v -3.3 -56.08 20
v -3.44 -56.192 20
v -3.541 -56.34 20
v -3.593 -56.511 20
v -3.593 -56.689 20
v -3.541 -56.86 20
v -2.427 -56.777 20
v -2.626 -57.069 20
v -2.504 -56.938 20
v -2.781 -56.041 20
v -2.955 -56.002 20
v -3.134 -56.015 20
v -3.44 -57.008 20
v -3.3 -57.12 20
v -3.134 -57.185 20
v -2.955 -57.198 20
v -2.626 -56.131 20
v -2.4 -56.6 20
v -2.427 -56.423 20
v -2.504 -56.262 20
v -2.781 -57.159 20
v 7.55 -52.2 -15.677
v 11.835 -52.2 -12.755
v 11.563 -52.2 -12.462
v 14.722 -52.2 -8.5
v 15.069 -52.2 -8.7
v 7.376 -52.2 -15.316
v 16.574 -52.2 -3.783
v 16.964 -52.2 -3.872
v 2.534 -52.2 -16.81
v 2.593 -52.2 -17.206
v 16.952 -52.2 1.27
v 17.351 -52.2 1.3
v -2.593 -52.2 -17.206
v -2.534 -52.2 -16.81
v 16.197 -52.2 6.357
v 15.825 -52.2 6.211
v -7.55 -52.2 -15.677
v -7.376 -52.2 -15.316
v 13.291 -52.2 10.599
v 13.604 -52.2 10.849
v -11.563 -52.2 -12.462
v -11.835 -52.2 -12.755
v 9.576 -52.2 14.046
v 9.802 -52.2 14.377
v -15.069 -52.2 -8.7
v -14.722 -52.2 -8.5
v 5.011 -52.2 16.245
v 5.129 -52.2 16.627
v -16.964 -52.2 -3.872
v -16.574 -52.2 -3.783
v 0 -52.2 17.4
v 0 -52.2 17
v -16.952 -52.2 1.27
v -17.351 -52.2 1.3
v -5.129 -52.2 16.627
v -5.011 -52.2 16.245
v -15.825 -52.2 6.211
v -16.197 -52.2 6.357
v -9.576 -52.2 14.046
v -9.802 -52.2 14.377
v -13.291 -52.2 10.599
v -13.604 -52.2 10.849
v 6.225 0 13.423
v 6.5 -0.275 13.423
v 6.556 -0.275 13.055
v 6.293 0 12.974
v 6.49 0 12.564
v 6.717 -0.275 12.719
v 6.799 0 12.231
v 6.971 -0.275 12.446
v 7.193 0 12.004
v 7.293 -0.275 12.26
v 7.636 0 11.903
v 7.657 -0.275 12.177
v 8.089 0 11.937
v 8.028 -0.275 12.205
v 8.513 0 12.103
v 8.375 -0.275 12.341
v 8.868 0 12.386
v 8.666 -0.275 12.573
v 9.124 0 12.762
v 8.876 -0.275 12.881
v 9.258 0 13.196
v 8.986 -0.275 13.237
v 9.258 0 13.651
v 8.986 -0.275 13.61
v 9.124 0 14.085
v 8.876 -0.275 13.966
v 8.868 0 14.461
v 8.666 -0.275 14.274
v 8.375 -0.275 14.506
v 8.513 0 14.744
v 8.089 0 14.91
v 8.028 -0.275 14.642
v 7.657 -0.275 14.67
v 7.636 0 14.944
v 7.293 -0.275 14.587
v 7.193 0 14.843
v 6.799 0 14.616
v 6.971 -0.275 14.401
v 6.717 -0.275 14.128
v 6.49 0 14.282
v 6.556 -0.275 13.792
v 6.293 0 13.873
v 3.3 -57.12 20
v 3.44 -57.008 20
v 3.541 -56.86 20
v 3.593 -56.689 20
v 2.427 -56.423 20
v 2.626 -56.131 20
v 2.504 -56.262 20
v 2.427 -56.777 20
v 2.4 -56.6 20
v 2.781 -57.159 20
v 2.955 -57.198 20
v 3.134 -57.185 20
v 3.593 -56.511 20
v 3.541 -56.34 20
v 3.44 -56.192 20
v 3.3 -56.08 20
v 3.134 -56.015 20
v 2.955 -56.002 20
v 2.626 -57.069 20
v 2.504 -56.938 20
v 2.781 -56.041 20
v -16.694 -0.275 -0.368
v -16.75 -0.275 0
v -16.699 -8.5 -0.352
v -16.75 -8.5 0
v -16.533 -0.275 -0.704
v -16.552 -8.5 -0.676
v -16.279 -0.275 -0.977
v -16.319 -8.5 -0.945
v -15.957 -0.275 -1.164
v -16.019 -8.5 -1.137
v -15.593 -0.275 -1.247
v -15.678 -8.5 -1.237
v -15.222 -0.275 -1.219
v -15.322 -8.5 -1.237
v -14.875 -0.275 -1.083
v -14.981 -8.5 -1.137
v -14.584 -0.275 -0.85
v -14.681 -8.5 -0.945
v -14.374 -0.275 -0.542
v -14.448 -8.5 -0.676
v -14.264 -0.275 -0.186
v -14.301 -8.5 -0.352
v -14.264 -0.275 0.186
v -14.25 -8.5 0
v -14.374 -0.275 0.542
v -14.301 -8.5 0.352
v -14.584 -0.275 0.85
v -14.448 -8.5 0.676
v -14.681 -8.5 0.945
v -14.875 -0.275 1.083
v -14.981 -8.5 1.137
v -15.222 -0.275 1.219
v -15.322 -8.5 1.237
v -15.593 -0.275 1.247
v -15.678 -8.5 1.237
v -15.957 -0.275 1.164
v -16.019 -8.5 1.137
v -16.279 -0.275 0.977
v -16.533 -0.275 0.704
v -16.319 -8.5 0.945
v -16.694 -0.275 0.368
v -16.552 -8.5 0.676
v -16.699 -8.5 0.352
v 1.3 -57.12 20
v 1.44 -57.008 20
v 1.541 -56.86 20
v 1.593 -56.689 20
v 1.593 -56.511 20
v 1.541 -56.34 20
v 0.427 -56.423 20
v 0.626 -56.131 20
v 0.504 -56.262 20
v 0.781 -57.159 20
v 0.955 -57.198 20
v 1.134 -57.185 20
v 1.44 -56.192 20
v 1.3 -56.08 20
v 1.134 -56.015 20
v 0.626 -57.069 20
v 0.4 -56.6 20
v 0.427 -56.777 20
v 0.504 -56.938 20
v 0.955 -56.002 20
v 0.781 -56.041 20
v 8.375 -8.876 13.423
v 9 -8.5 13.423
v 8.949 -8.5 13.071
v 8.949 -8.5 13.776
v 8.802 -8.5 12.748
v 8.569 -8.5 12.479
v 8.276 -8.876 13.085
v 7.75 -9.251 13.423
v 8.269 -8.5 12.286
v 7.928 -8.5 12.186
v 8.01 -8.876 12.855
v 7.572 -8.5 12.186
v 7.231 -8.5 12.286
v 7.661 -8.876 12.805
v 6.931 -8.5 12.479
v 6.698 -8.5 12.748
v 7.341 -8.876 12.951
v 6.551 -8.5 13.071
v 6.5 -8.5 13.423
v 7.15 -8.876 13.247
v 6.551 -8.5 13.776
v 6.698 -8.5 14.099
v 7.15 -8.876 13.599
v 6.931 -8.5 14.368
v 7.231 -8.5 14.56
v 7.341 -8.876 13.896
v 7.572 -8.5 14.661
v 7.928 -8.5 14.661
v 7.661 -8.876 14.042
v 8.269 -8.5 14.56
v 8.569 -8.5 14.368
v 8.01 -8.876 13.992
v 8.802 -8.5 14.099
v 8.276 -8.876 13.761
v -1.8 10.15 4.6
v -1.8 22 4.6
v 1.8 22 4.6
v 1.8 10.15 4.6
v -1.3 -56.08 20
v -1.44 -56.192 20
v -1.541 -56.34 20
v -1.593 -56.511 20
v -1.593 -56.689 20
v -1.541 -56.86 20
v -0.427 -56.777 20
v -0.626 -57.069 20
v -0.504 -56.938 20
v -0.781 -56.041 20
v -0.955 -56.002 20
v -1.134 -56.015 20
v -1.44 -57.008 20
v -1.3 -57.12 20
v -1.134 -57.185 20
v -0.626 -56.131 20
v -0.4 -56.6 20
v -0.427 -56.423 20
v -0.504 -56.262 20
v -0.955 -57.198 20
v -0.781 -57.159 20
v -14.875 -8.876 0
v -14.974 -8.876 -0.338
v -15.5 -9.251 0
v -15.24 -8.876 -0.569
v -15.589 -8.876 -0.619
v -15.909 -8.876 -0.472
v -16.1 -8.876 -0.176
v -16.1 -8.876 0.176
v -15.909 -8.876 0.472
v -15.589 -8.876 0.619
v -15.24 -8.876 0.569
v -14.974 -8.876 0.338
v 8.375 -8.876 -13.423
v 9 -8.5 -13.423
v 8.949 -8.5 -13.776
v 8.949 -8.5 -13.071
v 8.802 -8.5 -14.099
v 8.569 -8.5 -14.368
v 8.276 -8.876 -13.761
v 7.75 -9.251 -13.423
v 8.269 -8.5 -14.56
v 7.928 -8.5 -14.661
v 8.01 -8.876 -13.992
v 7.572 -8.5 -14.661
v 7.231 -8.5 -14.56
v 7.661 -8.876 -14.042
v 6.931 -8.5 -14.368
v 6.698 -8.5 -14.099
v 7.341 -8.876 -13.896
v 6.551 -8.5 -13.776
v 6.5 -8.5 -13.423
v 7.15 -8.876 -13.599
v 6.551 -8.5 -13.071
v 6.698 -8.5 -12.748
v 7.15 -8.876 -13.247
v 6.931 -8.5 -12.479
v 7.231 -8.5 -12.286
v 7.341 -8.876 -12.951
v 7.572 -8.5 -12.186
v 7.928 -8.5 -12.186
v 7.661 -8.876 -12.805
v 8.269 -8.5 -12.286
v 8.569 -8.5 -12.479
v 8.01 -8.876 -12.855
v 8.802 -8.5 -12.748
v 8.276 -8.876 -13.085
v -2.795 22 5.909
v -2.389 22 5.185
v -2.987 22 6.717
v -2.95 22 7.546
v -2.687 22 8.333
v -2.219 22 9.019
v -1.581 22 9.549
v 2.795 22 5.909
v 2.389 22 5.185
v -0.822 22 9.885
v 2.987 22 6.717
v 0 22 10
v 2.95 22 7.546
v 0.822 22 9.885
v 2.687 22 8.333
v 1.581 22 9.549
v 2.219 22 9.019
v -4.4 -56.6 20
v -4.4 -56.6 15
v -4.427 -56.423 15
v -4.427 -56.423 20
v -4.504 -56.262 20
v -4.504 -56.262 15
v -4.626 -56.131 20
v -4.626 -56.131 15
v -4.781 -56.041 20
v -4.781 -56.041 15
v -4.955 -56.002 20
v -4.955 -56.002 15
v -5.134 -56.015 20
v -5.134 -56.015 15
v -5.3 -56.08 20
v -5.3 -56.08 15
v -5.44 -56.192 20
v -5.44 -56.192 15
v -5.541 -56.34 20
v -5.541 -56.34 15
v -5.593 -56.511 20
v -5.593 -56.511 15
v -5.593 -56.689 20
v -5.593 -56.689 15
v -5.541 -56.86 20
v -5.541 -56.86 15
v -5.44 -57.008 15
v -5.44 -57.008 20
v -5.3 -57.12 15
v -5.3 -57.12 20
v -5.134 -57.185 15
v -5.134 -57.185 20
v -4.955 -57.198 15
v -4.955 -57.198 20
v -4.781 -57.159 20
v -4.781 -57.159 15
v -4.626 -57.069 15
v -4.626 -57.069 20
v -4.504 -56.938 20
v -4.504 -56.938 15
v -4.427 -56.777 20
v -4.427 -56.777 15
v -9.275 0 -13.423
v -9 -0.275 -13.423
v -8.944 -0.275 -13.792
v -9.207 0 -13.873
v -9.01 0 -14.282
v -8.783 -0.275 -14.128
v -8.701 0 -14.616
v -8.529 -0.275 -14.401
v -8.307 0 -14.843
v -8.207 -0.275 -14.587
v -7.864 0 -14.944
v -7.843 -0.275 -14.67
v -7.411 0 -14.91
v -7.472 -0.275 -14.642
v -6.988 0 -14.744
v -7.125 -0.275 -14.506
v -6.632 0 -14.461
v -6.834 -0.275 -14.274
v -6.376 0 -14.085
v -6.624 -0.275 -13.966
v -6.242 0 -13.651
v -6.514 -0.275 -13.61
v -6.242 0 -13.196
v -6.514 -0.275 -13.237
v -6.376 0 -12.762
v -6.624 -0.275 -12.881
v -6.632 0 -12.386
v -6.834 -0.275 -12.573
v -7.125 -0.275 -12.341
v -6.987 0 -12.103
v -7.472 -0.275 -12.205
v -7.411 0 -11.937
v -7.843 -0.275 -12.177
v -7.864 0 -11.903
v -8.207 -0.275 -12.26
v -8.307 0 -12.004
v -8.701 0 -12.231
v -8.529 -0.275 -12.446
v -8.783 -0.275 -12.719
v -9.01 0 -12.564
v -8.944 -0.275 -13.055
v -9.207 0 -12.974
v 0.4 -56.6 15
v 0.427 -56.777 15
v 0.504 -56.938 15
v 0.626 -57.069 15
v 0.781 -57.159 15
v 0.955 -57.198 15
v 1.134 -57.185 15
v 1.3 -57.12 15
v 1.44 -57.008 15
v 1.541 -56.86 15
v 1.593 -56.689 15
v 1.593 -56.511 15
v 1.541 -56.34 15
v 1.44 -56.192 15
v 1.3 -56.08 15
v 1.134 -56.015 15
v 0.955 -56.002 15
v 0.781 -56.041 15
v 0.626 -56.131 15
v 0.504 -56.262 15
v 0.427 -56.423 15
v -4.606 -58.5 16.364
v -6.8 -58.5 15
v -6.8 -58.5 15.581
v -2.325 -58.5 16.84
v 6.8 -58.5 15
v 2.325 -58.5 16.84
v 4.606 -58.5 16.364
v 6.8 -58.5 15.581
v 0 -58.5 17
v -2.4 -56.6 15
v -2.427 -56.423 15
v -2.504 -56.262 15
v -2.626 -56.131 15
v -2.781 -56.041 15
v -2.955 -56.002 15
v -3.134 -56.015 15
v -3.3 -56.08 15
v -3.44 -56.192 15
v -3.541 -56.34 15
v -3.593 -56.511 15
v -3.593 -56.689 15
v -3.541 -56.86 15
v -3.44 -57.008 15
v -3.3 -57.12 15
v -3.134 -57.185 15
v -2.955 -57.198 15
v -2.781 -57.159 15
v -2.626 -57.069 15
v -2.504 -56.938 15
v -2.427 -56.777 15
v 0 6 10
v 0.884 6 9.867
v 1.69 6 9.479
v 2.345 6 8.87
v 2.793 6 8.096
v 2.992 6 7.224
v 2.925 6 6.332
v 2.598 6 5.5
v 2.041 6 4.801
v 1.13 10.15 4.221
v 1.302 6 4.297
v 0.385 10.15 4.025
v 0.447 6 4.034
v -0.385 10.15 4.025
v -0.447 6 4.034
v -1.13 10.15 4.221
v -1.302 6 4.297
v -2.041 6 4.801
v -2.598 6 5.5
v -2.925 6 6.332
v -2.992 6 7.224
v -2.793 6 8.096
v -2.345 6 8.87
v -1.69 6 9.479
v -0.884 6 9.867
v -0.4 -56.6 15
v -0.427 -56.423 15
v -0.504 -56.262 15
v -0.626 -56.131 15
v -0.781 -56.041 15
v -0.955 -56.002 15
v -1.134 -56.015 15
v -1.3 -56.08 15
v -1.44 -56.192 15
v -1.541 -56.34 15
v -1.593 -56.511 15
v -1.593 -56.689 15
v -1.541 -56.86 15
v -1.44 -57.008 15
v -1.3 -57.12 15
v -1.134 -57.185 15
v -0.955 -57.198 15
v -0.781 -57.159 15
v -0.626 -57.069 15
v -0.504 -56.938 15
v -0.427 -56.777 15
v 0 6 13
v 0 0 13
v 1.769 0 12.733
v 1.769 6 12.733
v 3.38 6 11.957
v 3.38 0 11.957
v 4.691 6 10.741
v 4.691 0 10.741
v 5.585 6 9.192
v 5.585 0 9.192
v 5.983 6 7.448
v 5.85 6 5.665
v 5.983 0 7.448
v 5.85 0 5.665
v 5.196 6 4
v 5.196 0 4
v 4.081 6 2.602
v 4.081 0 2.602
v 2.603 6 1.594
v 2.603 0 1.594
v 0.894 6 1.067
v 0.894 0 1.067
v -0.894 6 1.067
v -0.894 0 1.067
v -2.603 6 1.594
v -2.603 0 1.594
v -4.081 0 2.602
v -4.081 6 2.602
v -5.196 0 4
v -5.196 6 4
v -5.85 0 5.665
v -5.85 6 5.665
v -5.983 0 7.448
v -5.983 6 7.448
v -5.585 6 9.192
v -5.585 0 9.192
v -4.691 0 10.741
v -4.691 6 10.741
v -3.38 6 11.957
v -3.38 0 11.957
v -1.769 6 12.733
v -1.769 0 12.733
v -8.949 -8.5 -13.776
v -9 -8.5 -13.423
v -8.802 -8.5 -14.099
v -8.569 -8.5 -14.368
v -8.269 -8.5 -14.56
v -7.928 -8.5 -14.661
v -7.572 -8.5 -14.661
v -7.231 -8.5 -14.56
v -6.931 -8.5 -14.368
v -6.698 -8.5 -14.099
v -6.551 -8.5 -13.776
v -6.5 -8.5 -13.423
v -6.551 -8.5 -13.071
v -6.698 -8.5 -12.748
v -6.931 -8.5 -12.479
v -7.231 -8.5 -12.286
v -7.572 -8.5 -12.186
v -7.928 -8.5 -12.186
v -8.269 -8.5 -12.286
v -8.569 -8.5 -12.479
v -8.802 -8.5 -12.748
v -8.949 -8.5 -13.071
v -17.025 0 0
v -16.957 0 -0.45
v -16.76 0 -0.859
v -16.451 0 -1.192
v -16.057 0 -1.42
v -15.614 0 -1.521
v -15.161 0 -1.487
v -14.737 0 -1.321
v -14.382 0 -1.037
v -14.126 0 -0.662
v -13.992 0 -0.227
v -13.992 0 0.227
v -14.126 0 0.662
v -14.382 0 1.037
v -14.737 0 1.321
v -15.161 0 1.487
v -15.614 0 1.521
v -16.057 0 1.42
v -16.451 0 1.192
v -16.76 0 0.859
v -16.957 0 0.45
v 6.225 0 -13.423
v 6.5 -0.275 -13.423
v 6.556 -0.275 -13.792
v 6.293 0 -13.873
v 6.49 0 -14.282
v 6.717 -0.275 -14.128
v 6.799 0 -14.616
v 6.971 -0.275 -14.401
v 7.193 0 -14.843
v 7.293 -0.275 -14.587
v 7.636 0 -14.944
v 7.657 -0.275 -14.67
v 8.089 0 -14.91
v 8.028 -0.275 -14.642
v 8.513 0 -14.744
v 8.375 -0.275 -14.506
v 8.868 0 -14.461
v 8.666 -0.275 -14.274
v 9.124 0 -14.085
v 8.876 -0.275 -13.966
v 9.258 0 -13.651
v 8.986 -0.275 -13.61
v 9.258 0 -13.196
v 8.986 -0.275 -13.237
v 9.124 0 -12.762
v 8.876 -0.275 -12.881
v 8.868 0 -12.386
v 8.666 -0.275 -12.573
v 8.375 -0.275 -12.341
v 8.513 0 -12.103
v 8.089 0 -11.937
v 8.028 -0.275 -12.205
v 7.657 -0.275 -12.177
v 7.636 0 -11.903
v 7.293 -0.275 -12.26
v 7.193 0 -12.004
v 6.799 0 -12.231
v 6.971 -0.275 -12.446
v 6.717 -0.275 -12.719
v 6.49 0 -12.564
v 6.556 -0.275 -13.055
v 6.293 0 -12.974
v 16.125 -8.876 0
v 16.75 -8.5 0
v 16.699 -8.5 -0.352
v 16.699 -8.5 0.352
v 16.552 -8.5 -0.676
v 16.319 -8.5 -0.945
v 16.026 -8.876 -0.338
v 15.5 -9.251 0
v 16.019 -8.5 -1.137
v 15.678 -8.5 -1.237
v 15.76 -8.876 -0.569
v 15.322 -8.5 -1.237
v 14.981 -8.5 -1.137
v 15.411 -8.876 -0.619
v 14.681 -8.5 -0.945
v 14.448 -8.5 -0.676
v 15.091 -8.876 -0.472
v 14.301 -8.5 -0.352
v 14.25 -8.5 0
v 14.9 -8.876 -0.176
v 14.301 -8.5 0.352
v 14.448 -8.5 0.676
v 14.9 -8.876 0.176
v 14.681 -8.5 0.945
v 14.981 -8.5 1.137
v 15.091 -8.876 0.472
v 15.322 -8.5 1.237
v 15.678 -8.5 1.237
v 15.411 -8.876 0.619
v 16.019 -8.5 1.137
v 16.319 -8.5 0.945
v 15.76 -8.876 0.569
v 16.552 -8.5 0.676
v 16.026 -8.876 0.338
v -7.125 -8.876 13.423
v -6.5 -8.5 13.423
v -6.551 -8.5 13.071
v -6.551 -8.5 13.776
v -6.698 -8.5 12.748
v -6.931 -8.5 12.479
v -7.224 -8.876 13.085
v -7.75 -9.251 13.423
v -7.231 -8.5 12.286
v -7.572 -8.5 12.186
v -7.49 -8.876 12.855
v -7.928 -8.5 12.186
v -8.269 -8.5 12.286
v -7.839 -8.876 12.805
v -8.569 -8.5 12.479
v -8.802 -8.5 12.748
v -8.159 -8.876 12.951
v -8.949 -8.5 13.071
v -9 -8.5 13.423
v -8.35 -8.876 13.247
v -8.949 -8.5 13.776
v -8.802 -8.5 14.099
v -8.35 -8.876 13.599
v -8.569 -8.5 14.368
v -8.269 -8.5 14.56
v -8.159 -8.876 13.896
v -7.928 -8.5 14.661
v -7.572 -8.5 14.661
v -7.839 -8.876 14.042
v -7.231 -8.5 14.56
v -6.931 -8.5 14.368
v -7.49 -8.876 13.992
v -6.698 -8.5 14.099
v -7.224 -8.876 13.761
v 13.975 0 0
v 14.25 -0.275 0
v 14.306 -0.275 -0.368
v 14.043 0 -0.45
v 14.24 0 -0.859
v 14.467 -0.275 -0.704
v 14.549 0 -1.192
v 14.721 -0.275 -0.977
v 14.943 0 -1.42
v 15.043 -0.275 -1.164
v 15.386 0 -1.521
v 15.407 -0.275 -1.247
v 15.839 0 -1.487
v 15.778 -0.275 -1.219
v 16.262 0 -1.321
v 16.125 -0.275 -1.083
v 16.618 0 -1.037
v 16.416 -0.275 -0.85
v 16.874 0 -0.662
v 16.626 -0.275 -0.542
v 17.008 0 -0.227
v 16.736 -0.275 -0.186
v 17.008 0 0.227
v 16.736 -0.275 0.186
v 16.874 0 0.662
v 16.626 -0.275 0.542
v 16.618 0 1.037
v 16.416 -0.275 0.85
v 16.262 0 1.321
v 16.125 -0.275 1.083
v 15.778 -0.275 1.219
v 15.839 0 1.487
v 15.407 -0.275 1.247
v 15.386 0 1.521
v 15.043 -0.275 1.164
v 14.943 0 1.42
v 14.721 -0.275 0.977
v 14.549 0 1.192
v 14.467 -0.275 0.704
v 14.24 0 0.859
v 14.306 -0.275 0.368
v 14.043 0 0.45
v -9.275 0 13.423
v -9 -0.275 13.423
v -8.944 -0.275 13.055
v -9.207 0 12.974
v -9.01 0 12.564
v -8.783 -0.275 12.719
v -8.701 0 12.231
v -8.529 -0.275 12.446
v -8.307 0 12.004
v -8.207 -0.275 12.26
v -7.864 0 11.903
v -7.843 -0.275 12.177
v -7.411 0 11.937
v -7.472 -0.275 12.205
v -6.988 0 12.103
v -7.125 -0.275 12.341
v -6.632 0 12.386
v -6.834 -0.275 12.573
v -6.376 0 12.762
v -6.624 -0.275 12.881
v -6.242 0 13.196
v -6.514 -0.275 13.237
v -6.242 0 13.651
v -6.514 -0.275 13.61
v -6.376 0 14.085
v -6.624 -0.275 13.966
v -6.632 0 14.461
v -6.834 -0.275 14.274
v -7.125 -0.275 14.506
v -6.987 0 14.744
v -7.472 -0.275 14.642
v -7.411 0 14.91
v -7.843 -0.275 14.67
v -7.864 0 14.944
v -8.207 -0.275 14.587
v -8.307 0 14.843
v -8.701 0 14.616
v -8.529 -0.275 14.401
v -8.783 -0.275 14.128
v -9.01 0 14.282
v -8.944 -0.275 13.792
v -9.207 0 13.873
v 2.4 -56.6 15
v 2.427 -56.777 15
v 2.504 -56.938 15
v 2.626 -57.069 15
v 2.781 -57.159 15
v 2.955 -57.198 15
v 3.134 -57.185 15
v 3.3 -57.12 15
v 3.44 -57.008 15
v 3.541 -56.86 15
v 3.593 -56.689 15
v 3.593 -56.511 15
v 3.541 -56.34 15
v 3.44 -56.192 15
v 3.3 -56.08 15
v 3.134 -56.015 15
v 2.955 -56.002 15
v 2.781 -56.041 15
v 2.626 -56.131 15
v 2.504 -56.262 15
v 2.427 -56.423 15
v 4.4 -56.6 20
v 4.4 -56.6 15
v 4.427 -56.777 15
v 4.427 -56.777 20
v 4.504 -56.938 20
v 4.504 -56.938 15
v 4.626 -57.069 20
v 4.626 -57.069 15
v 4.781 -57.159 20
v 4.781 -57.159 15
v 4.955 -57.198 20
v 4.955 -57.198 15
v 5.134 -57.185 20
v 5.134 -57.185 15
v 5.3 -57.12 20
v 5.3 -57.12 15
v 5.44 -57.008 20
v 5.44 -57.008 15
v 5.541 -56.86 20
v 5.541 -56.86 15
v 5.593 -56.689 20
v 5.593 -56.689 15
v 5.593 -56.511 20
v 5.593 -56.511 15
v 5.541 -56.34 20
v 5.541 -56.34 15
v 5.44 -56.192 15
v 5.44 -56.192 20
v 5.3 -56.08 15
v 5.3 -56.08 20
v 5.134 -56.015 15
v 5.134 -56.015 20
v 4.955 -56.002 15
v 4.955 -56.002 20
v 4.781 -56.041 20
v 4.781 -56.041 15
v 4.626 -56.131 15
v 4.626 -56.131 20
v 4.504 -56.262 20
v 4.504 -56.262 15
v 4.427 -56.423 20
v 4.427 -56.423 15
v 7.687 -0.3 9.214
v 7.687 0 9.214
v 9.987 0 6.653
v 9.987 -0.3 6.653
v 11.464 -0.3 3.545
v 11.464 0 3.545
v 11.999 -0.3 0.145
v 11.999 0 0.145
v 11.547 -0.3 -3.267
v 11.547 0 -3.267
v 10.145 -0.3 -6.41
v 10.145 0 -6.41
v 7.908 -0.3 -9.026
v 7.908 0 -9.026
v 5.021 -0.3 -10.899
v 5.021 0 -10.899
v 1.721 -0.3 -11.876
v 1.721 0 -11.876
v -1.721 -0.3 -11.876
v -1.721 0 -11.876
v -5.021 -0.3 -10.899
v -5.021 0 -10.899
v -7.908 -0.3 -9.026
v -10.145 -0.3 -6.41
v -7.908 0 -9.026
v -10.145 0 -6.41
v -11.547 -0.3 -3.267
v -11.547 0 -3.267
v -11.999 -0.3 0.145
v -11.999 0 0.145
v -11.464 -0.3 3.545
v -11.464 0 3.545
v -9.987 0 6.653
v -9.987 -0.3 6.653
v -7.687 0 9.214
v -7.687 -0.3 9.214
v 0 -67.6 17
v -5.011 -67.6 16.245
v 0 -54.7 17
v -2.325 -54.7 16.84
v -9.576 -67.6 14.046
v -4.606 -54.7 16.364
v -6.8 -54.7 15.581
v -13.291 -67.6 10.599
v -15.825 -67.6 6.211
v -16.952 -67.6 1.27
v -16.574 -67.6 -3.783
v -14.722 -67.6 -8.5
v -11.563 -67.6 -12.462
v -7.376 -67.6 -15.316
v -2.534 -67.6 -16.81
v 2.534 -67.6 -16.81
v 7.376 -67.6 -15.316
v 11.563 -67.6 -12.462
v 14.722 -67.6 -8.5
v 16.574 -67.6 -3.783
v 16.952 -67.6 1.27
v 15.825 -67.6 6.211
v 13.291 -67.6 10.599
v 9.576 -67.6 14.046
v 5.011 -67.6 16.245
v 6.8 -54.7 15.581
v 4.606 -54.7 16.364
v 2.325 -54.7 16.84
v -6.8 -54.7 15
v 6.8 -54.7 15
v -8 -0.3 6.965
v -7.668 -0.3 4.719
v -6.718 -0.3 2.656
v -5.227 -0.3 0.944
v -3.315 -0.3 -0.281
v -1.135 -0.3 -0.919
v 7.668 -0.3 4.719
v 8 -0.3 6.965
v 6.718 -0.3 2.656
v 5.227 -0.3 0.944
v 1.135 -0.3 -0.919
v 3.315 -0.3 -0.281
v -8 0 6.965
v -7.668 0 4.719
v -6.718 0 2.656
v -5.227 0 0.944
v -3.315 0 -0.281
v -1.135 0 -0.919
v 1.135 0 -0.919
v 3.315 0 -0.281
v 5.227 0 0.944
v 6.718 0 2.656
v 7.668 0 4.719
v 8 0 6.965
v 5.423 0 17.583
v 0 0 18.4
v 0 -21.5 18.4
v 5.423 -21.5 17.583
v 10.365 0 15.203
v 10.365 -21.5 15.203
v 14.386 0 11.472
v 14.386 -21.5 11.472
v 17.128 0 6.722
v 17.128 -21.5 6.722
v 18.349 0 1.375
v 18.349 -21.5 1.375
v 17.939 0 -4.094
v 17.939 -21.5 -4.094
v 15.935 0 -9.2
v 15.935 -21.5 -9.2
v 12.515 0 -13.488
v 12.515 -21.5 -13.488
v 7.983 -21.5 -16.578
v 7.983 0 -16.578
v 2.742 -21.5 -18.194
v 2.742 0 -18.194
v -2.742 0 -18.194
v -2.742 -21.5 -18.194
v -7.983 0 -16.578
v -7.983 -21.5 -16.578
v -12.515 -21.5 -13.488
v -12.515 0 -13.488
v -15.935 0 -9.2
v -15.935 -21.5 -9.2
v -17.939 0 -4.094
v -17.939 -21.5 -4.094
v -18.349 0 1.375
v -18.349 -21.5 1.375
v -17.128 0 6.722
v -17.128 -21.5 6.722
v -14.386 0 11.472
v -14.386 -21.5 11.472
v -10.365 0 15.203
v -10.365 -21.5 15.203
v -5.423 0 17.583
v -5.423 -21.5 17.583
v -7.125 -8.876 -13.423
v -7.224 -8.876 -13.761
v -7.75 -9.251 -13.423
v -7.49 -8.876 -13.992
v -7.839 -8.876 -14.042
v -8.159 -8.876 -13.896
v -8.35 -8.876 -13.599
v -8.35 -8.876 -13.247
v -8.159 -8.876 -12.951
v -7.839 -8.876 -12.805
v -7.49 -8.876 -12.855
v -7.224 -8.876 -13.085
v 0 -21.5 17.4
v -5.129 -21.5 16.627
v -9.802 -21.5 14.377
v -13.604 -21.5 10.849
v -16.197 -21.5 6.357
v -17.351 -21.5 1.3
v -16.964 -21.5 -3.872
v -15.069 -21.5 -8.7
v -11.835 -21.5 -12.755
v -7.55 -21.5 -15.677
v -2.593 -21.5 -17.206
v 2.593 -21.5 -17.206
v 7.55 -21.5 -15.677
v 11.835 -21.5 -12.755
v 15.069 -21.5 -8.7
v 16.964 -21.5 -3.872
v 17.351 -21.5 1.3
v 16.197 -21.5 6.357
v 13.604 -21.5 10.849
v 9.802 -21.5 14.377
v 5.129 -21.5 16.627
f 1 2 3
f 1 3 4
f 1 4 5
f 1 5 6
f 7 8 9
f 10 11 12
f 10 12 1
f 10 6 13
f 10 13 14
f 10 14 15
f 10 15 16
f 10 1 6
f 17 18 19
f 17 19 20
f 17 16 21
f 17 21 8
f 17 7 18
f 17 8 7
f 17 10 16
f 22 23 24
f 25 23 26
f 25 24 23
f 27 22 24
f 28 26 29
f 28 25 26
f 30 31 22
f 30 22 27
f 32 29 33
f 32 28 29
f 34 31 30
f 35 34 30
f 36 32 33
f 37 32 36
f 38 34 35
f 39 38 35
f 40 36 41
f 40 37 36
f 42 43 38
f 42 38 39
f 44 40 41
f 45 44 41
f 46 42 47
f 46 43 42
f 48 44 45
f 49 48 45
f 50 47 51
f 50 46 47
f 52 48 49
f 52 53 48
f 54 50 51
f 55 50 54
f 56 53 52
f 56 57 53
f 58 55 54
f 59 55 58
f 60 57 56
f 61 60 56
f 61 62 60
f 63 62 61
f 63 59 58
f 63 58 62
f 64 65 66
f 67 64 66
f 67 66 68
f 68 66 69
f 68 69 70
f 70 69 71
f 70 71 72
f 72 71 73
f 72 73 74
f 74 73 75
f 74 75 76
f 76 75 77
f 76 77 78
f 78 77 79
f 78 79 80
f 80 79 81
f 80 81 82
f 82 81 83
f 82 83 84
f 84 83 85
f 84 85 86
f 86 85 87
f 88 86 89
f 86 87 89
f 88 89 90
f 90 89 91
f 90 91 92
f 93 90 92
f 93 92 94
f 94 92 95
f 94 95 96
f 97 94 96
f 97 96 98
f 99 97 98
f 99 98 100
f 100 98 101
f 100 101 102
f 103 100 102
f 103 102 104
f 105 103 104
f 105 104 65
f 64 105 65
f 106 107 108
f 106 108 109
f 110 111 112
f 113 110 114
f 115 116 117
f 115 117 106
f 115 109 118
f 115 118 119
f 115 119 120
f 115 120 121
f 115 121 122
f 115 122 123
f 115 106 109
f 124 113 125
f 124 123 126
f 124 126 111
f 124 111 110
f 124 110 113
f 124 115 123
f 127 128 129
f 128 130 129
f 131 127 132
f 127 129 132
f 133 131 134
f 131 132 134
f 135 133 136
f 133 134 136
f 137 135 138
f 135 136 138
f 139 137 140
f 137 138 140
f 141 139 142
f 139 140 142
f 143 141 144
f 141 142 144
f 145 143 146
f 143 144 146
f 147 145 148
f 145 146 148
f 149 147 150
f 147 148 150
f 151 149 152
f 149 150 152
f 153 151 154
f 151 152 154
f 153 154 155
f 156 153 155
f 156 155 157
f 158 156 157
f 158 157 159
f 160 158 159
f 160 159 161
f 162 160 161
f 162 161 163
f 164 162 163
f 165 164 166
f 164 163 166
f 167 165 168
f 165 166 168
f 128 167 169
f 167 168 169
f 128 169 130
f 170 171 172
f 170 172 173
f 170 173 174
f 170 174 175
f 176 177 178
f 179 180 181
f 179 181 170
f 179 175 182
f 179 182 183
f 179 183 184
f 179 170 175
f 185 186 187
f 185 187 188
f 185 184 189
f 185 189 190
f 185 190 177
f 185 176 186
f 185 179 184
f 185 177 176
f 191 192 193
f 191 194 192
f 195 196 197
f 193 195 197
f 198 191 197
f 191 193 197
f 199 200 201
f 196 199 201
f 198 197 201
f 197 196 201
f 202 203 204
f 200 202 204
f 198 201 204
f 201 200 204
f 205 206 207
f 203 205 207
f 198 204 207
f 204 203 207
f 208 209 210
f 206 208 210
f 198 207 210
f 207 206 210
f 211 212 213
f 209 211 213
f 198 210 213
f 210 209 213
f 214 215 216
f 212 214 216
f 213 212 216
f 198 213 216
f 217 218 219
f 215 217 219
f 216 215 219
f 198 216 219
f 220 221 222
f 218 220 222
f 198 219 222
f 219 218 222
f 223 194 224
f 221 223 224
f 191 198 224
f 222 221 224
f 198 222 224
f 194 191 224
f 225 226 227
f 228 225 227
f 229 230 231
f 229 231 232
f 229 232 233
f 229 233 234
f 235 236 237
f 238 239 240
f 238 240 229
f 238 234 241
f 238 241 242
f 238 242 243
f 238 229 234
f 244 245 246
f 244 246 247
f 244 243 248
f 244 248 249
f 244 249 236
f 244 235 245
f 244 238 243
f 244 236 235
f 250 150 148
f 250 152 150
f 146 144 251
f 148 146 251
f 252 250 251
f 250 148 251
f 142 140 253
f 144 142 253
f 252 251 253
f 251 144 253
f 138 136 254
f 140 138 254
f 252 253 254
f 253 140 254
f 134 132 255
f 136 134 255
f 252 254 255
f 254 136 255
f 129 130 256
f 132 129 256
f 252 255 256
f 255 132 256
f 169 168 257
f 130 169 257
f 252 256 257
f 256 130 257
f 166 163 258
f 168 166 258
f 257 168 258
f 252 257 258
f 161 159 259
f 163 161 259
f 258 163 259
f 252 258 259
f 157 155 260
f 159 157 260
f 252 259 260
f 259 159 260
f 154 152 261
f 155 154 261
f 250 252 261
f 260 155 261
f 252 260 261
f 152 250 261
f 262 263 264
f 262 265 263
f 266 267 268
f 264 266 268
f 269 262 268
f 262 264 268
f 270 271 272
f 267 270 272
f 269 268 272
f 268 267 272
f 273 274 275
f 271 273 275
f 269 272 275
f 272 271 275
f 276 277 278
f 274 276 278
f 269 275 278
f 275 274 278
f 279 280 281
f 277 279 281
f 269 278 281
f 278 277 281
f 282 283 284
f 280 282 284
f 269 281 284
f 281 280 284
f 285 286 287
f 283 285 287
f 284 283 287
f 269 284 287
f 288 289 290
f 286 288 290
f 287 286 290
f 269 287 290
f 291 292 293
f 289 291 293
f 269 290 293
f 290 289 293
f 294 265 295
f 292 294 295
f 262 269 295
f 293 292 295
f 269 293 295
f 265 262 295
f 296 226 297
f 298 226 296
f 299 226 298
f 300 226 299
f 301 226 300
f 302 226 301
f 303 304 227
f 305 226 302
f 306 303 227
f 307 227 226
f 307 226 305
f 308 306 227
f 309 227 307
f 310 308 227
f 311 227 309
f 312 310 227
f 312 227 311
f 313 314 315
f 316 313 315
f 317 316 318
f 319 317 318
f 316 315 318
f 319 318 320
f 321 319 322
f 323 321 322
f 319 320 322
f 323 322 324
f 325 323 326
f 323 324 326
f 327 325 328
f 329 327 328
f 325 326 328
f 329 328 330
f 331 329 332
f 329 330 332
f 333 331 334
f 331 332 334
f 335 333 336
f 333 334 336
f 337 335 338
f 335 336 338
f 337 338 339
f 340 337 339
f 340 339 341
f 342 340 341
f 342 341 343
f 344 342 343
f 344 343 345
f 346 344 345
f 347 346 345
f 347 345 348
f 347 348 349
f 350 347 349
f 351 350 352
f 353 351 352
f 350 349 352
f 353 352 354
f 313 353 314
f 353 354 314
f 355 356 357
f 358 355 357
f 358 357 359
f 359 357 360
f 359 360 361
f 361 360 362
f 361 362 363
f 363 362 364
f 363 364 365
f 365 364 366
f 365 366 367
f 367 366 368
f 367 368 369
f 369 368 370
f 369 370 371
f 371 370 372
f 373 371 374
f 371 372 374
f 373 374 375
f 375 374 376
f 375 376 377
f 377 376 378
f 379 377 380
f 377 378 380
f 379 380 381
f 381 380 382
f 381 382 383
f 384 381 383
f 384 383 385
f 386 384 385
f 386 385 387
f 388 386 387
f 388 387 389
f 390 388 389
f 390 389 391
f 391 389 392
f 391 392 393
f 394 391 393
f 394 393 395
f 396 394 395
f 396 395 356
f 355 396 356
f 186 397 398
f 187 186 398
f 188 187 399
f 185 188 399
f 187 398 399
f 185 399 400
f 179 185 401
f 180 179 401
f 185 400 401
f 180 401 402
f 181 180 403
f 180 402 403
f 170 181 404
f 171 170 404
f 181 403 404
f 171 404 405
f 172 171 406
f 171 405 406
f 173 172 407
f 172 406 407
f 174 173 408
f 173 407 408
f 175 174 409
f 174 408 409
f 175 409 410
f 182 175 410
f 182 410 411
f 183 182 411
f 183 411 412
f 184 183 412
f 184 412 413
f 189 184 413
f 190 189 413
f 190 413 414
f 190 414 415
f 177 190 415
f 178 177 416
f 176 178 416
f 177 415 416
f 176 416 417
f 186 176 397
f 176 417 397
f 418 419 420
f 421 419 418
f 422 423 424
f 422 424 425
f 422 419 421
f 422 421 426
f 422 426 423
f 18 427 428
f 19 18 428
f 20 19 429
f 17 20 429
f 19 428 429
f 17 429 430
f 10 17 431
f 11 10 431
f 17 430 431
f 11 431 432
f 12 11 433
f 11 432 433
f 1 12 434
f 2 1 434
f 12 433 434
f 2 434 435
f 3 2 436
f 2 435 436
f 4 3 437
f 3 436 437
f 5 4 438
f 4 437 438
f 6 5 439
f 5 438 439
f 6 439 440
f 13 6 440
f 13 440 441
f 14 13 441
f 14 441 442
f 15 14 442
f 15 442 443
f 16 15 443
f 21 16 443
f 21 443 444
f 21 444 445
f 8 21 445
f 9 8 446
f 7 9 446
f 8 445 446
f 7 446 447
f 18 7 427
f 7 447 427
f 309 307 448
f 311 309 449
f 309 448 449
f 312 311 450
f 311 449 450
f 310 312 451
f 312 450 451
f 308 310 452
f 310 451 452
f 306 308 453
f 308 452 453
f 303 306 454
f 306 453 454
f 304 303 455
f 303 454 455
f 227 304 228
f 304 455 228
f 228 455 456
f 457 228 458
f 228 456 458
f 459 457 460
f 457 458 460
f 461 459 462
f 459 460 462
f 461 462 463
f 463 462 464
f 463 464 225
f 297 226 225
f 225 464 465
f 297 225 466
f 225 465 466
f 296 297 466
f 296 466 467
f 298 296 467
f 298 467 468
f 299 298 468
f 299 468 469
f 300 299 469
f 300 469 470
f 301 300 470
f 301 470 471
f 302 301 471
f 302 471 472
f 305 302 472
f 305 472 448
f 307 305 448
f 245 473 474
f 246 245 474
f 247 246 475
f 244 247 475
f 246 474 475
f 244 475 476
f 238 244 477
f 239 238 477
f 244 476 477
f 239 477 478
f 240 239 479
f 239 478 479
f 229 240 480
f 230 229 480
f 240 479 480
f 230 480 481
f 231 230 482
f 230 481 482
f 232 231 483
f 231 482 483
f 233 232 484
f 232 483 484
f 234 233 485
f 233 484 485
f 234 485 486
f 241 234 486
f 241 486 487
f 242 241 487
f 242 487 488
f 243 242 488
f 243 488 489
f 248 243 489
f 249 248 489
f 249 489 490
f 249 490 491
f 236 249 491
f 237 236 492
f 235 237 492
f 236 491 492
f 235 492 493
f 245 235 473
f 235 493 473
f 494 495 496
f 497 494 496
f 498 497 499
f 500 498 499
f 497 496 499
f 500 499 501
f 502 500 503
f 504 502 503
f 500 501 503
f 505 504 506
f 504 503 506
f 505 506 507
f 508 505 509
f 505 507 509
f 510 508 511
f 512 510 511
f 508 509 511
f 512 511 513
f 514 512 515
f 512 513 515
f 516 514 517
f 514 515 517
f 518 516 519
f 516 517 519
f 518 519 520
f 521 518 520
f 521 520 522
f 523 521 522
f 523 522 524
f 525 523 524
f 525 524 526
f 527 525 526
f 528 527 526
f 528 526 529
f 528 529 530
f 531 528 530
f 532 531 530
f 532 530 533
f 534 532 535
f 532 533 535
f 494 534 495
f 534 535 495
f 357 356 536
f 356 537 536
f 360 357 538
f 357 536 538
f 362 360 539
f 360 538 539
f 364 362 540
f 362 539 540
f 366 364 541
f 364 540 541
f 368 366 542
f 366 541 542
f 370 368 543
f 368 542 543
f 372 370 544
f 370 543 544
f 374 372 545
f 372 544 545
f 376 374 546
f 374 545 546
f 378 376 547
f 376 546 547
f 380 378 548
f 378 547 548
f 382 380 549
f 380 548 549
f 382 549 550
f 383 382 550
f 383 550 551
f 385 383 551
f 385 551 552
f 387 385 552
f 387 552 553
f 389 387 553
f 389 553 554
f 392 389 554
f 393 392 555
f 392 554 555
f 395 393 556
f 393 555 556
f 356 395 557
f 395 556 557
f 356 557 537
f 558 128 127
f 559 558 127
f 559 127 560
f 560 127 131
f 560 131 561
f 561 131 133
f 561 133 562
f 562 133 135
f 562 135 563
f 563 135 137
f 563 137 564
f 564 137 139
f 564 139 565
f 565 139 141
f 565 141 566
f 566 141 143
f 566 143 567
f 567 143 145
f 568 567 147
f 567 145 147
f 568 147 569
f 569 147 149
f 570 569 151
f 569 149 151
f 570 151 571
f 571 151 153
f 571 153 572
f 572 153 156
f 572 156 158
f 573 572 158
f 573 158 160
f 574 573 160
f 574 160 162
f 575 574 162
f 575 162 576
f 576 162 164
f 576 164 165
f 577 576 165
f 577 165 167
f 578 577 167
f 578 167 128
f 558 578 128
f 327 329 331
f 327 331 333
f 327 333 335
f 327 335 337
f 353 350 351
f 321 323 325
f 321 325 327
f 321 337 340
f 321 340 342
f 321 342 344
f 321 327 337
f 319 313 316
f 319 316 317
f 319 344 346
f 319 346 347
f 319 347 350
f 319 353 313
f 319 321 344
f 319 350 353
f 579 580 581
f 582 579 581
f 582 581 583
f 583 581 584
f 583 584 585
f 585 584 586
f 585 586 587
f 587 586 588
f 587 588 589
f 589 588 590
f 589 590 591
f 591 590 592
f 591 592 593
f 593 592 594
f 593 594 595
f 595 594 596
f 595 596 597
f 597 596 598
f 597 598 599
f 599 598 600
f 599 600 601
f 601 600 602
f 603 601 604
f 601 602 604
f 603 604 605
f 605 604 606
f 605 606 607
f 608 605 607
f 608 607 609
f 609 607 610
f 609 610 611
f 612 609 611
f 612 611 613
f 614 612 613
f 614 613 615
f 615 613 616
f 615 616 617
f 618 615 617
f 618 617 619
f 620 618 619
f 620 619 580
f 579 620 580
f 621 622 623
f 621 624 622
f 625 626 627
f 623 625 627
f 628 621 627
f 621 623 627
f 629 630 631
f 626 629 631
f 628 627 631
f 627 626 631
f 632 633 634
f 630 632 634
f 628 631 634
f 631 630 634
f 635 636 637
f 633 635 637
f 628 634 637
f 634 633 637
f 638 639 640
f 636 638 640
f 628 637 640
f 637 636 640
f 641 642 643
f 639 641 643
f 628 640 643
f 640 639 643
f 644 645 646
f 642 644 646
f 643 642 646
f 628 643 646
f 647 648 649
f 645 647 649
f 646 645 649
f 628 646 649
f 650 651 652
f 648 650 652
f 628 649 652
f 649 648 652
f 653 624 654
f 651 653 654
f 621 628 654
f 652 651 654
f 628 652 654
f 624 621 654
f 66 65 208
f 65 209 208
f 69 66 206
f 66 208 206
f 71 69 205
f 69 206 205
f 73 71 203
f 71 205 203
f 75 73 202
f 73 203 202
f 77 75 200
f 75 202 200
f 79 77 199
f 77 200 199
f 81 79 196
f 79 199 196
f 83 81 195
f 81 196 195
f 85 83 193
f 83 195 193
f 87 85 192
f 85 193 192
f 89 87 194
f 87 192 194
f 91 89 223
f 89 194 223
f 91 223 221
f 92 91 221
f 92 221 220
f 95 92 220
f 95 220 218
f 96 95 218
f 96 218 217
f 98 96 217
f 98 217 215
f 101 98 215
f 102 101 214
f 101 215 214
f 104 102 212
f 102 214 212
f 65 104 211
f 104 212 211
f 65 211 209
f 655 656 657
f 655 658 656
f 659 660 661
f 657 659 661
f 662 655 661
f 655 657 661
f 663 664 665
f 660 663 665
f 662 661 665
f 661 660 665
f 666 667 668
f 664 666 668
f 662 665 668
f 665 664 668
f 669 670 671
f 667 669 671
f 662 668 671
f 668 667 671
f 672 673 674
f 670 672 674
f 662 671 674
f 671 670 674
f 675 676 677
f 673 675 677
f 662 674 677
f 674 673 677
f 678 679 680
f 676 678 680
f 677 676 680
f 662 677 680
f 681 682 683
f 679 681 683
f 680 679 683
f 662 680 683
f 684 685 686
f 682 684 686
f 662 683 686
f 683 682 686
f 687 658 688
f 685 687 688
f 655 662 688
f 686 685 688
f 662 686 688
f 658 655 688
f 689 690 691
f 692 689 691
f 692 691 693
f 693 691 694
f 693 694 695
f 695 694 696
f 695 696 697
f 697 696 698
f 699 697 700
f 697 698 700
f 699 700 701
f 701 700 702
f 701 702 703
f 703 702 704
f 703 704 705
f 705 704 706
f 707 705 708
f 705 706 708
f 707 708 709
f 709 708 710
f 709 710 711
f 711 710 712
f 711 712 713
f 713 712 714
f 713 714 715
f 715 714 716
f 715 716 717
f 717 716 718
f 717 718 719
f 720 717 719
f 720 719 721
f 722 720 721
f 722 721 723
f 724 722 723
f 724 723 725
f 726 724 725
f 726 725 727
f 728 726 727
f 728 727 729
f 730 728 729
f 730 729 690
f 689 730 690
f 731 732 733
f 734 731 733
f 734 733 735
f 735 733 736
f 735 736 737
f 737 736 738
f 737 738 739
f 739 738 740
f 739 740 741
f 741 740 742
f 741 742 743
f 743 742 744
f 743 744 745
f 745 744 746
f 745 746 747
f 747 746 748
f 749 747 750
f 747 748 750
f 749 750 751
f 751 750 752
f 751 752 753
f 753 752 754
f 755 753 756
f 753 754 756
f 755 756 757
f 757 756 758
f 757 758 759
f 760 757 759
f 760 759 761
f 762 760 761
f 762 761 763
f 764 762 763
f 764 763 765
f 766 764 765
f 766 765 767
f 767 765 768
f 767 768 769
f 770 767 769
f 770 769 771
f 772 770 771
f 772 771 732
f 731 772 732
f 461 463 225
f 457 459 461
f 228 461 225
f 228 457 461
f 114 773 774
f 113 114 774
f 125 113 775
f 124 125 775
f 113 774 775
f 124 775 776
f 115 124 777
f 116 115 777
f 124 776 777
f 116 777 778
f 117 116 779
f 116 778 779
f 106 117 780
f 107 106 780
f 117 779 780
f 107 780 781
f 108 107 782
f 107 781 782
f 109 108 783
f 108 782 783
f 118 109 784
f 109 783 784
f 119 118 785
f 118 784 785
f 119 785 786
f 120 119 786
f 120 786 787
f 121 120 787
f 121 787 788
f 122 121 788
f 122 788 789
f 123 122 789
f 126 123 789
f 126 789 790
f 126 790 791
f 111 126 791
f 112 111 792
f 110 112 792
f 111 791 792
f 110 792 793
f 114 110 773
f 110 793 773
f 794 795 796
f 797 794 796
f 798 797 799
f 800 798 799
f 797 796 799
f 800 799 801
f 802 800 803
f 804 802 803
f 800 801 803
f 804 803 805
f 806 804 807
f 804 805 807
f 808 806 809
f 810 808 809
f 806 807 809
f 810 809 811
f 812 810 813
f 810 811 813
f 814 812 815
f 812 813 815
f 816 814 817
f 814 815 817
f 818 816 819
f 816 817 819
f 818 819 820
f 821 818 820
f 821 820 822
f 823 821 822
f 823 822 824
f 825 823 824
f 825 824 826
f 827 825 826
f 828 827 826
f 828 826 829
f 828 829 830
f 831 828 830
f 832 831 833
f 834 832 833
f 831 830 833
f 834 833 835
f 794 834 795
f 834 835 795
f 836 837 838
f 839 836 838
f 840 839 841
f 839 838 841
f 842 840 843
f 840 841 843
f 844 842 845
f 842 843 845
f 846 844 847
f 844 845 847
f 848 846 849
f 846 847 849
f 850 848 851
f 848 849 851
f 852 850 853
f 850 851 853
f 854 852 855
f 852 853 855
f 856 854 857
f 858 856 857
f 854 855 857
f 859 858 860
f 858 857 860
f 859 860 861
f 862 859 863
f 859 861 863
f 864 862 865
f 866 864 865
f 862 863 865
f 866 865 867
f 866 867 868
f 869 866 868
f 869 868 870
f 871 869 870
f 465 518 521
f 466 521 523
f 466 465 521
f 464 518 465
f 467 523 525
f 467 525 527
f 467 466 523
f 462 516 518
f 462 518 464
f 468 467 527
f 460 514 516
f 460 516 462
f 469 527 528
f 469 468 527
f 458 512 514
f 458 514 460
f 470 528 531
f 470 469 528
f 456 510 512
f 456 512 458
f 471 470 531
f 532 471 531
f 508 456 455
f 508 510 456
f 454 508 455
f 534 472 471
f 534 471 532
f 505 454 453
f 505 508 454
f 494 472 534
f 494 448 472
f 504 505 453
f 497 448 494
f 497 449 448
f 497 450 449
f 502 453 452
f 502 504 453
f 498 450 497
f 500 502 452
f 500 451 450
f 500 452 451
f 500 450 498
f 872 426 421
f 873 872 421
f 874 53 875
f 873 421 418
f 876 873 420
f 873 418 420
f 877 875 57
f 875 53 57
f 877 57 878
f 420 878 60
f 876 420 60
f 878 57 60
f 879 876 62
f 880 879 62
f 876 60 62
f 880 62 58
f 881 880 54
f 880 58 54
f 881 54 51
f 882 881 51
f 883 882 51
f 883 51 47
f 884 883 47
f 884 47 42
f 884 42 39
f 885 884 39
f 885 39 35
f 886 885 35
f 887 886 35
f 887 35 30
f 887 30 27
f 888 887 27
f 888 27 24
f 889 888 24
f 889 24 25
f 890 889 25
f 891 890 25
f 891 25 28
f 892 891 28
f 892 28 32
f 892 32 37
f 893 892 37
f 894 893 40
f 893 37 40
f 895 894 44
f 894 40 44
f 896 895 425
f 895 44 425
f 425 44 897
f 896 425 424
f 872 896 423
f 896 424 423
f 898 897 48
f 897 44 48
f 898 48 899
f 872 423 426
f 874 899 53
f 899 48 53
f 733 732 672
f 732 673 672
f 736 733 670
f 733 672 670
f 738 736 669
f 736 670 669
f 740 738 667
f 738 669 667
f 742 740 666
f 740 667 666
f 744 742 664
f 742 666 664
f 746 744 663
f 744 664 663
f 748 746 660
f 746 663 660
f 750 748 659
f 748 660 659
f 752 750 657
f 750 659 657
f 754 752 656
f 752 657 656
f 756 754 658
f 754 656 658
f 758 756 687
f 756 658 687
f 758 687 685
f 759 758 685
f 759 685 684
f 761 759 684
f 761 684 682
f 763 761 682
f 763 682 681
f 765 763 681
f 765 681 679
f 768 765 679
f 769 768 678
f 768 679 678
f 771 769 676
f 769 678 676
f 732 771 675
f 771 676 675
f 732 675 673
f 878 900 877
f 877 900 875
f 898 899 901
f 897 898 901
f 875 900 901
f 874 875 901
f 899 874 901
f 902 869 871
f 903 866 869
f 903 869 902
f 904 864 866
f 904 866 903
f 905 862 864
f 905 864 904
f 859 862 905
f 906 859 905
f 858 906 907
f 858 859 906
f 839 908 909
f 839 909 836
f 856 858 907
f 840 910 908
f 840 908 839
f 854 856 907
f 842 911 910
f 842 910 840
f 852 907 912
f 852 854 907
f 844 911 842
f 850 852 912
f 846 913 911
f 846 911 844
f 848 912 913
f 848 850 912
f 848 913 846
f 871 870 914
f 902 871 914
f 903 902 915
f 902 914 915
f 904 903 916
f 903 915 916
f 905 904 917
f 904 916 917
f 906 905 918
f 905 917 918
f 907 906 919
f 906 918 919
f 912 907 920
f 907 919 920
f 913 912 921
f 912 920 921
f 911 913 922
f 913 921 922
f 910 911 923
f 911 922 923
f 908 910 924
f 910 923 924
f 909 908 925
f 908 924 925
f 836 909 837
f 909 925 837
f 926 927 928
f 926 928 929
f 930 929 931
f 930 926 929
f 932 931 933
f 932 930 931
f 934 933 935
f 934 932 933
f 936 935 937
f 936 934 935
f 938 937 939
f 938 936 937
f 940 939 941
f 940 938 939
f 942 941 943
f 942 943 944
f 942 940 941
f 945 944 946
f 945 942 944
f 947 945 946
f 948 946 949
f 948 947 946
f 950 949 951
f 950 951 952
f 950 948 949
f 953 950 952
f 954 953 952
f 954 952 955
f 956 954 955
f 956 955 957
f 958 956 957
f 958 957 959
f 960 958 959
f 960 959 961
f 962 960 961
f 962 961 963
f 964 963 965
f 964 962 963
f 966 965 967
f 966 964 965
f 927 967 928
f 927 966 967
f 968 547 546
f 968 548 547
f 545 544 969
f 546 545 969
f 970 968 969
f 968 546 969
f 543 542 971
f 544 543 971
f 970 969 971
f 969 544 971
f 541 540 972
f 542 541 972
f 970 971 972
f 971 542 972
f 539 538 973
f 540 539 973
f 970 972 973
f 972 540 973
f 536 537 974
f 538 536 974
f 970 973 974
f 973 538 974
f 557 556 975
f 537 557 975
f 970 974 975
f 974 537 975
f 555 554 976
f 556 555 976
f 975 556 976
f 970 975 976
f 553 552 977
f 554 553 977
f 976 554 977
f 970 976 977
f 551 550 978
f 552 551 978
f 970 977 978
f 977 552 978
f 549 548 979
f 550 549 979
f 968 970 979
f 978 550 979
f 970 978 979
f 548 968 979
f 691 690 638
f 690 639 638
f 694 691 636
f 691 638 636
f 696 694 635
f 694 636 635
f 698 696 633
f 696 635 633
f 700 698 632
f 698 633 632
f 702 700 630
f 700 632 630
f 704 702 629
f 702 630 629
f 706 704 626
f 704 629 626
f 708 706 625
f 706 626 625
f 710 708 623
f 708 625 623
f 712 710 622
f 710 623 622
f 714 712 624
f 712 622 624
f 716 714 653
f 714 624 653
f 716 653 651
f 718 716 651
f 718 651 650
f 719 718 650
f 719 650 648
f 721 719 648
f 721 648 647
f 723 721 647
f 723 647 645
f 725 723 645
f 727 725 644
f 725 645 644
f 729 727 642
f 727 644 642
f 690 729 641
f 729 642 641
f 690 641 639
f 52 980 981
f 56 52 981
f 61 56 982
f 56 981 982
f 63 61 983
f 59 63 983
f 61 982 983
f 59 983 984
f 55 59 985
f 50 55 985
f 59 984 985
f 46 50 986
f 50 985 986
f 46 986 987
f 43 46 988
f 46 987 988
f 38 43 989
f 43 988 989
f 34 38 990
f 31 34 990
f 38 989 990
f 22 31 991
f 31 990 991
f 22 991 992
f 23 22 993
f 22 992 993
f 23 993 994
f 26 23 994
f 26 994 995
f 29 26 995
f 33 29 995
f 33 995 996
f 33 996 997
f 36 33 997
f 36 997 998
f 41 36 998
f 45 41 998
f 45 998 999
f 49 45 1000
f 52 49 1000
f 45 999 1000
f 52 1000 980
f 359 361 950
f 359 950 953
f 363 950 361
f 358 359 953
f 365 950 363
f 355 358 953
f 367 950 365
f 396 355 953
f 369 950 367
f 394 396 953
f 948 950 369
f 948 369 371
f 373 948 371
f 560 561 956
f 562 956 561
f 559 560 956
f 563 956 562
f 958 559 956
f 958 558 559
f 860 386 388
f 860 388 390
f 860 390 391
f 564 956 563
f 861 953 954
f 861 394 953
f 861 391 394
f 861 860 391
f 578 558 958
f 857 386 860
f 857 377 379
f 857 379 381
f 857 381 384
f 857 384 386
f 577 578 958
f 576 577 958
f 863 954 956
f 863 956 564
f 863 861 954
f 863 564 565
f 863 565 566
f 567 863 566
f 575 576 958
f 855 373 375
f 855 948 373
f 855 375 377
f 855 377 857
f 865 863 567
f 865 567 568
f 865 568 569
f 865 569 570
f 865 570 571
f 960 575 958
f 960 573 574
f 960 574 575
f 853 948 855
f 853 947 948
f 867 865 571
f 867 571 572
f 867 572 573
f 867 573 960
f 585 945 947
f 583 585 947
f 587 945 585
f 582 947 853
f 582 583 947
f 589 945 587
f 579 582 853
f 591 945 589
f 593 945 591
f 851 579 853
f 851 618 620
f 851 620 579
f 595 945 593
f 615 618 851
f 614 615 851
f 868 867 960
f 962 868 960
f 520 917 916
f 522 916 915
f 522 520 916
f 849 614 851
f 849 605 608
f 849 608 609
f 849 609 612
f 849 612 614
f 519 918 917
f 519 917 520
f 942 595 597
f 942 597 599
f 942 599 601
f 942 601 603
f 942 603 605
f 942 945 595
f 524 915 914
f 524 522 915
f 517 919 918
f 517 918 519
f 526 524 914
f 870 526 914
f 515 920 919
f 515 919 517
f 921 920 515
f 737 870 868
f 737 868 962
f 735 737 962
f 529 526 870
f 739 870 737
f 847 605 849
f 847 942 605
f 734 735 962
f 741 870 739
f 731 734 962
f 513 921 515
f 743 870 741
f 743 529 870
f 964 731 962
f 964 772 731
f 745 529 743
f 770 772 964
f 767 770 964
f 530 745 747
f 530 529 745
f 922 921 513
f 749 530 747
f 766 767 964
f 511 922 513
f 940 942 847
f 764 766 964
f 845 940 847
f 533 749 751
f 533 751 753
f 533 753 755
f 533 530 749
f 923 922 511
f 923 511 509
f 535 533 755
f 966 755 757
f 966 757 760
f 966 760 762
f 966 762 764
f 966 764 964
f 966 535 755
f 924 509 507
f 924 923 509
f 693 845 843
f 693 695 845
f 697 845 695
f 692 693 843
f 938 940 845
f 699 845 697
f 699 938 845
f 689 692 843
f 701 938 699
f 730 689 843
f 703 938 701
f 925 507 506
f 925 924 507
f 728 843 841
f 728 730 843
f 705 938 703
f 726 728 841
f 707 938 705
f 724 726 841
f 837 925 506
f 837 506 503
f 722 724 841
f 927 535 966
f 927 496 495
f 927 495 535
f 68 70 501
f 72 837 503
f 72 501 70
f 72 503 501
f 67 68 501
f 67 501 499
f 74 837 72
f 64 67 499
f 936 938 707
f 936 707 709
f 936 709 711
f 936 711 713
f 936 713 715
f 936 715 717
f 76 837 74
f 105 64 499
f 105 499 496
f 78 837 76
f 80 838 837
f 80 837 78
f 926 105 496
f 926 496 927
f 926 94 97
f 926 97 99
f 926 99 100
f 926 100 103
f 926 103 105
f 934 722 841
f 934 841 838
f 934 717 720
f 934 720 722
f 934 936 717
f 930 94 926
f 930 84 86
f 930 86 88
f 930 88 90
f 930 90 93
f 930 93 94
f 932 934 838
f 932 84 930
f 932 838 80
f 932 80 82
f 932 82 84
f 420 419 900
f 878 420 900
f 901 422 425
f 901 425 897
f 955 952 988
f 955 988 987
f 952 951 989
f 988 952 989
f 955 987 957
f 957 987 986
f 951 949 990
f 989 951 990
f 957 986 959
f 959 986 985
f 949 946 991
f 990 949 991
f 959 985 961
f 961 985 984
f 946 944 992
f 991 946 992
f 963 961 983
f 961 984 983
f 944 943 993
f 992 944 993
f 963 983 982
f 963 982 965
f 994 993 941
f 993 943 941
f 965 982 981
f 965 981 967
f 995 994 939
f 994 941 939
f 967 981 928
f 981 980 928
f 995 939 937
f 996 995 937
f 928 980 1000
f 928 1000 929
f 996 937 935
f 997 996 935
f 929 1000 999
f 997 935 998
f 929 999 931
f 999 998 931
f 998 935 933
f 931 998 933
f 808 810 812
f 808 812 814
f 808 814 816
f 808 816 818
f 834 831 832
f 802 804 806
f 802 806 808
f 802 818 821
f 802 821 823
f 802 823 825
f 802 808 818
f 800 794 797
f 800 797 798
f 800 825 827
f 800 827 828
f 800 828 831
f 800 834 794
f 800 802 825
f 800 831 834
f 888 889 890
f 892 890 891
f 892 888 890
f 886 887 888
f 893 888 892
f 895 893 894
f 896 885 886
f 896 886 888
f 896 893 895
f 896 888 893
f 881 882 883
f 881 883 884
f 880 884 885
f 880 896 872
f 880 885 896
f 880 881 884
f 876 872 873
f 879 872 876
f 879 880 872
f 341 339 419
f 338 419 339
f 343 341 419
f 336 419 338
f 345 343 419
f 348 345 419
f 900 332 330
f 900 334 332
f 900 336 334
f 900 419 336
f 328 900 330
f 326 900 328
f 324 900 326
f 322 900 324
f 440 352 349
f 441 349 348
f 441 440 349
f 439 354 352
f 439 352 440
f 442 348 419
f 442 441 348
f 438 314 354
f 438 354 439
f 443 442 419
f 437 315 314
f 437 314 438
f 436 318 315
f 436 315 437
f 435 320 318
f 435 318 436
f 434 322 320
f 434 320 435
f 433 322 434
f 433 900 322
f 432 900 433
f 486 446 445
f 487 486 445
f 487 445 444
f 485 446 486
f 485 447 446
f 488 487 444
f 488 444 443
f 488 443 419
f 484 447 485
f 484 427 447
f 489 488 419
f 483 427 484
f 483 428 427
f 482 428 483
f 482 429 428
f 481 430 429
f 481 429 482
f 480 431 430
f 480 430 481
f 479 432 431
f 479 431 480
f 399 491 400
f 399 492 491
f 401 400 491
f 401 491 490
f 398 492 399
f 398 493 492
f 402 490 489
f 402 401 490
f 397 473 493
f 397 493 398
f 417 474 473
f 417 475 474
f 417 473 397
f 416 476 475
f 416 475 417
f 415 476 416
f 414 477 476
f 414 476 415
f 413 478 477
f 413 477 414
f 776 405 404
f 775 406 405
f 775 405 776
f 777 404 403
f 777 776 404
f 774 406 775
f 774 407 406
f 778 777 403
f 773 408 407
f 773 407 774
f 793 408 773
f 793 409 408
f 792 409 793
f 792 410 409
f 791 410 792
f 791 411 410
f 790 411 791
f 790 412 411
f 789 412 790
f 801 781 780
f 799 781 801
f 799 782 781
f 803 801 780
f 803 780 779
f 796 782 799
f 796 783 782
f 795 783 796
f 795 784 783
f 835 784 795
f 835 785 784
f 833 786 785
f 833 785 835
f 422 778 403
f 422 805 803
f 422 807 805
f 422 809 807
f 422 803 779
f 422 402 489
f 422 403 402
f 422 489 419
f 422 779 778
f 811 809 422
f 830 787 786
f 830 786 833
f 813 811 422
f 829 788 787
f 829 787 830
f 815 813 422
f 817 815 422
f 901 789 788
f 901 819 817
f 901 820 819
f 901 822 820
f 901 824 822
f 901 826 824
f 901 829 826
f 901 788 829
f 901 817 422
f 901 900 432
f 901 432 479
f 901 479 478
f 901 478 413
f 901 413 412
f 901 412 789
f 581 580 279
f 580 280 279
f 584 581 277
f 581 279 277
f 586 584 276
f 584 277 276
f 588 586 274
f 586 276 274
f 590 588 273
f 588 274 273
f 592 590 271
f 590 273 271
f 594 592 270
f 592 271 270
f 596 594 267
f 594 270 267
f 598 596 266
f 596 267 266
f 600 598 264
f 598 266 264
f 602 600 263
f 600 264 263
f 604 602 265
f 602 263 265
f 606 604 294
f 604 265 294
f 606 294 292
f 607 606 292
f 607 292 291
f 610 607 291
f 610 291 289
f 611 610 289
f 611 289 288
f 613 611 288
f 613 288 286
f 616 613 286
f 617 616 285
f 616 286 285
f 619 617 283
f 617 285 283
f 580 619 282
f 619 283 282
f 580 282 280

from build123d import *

# Parameters (mm, degrees)
SKETCH_1_R                   = 18.4
EXTRUDE_1_DEPTH              = 21.5
SKETCH_2_R                   = 6
EXTRUDE_2_DEPTH              = 6
SKETCH_3_R                   = 3
EXTRUDE_3_DEPTH              = 16
SKETCH_4_W                   = 5
SKETCH_4_H                   = 1
CUT_EXTRUDE_1_DEPTH          = 11.85
SKETCH_5_R                   = 17.4
EXTRUDE_4_DEPTH              = 30.7
SKETCH_6_R                   = 17
EXTRUDE_5_DEPTH              = 15.4
CUT_EXTRUDE_START            = 15
SKETCH_7_W                   = 13.6
SKETCH_7_H                   = 3.8
CUT_EXTRUDE_2_DEPTH          = 58.435350486
SKETCH_8_R                   = 0.6
EXTRUDE_6_DEPTH              = 5
HOLE_WIZARD_M3_1_D           = 2.5
HOLE_WIZARD_M3_1_DEPTH       = 8.5
HOLE_WIZARD_M3_1_CSINK_D     = 3.05
HOLE_WIZARD_M3_1_CSINK_ANGLE = 90
HOLE_WIZARD_M3_1_TIP         = 0.751075774
CUT_EXTRUDE_3_DEPTH          = 0.3


with BuildPart() as part:
    # 草图1 → 凸台-拉伸1 (new body)
    with BuildSketch(Plane(origin=(0, 0, 0), x_dir=(1, 0, 0), z_dir=(0, 1, 0))):
        with Locations(Location((0, 0, 0), (0, 0, 270))):
            Circle(SKETCH_1_R)
    extrude(amount=-EXTRUDE_1_DEPTH)

    # 草图2 → 凸台-拉伸2 (add)
    with BuildSketch(Plane(origin=(0, 0, 0), x_dir=(1, 0, 0), z_dir=(0, 1, 0))):
        with Locations(Location((0, -7, 0), (0, 0, 270))):
            Circle(SKETCH_2_R)
    extrude(amount=EXTRUDE_2_DEPTH)

    # 草图3 → 凸台-拉伸3 (add)
    with BuildSketch(Plane(origin=(0, 6, 0), x_dir=(1, 0, 0), z_dir=(0, 1, 0))):
        with Locations(Location((0, -7, 0), (0, 0, 270))):
            Circle(SKETCH_3_R)
    extrude(amount=EXTRUDE_3_DEPTH)

    # 草图4 → 切除-拉伸1 (cut)
    with BuildSketch(Plane(origin=(0, 22, 0), x_dir=(1, 0, 0), z_dir=(0, 1, 0))):
        with Locations((0, -4.1)):
            Rectangle(SKETCH_4_W, SKETCH_4_H)
    extrude(amount=-CUT_EXTRUDE_1_DEPTH, mode=Mode.SUBTRACT)

    # 草图5 → 凸台-拉伸4 (add)
    with BuildSketch(Plane.XZ.offset(21.5)):
        with Locations(Location((0, 0, 0), (0, 0, 90))):
            Circle(SKETCH_5_R)
    extrude(amount=EXTRUDE_4_DEPTH)

    # 草图6 → 凸台-拉伸5 (add)
    with BuildSketch(Plane.XZ.offset(52.2)):
        with Locations(Location((0, 0, 0), (0, 0, 90))):
            Circle(SKETCH_6_R)
    extrude(amount=EXTRUDE_5_DEPTH)

    # 草图7 → 切除-拉伸2 (cut, through all)
    with BuildSketch(Plane.XY.offset(CUT_EXTRUDE_START)):
        with Locations((0, -56.6)):
            Rectangle(SKETCH_7_W, SKETCH_7_H)
    extrude(amount=CUT_EXTRUDE_2_DEPTH, mode=Mode.SUBTRACT)

    # 草图8 → 凸台-拉伸6 (add)
    with BuildSketch(Plane.XY.offset(15)):
        with Locations((-5, -56.6)):
            Circle(SKETCH_8_R)
        with Locations((-3, -56.6)):
            Circle(SKETCH_8_R)
        with Locations((-1, -56.6)):
            Circle(SKETCH_8_R)
        with Locations(Location((1, -56.6, 0), (0, 0, 180))):
            Circle(SKETCH_8_R)
        with Locations(Location((3, -56.6, 0), (0, 0, 180))):
            Circle(SKETCH_8_R)
        with Locations(Location((5, -56.6, 0), (0, 0, 180))):
            Circle(SKETCH_8_R)
    extrude(amount=EXTRUDE_6_DEPTH)

    # M3 螺纹孔1
    with Locations(Plane(origin=(0, 0, 0), x_dir=(1, 0, 0), z_dir=(0, 1, 0))):
        with Locations((-7.75, 13.423393759), (15.5, 0), (7.75, -13.423393759), (-7.75, -13.423393759), (-15.5, 0), (7.75, 13.423393759)):
            CounterSinkHole(HOLE_WIZARD_M3_1_D / 2, HOLE_WIZARD_M3_1_CSINK_D / 2, depth=HOLE_WIZARD_M3_1_DEPTH, counter_sink_angle=HOLE_WIZARD_M3_1_CSINK_ANGLE)
            with Locations((0, 0, -(HOLE_WIZARD_M3_1_DEPTH + HOLE_WIZARD_M3_1_TIP / 2))):  # 118° drill point
                Cone(0, HOLE_WIZARD_M3_1_D / 2, HOLE_WIZARD_M3_1_TIP, mode=Mode.SUBTRACT)

    # 草图12 → 切除-拉伸3 (cut)
    with BuildSketch(Plane(origin=(0, 0, 0), x_dir=(1, 0, 0), z_dir=(0, 1, 0))):
        with BuildLine():
            ThreePointArc((7.687453335, -9.214285714), (0, 12), (-7.687453335, -9.214285714))
            ThreePointArc((-7.687453335, -9.214285714), (0, 1), (7.687453335, -9.214285714))
        make_face()
    extrude(amount=-CUT_EXTRUDE_3_DEPTH, mode=Mode.SUBTRACT)


solid = part.part
